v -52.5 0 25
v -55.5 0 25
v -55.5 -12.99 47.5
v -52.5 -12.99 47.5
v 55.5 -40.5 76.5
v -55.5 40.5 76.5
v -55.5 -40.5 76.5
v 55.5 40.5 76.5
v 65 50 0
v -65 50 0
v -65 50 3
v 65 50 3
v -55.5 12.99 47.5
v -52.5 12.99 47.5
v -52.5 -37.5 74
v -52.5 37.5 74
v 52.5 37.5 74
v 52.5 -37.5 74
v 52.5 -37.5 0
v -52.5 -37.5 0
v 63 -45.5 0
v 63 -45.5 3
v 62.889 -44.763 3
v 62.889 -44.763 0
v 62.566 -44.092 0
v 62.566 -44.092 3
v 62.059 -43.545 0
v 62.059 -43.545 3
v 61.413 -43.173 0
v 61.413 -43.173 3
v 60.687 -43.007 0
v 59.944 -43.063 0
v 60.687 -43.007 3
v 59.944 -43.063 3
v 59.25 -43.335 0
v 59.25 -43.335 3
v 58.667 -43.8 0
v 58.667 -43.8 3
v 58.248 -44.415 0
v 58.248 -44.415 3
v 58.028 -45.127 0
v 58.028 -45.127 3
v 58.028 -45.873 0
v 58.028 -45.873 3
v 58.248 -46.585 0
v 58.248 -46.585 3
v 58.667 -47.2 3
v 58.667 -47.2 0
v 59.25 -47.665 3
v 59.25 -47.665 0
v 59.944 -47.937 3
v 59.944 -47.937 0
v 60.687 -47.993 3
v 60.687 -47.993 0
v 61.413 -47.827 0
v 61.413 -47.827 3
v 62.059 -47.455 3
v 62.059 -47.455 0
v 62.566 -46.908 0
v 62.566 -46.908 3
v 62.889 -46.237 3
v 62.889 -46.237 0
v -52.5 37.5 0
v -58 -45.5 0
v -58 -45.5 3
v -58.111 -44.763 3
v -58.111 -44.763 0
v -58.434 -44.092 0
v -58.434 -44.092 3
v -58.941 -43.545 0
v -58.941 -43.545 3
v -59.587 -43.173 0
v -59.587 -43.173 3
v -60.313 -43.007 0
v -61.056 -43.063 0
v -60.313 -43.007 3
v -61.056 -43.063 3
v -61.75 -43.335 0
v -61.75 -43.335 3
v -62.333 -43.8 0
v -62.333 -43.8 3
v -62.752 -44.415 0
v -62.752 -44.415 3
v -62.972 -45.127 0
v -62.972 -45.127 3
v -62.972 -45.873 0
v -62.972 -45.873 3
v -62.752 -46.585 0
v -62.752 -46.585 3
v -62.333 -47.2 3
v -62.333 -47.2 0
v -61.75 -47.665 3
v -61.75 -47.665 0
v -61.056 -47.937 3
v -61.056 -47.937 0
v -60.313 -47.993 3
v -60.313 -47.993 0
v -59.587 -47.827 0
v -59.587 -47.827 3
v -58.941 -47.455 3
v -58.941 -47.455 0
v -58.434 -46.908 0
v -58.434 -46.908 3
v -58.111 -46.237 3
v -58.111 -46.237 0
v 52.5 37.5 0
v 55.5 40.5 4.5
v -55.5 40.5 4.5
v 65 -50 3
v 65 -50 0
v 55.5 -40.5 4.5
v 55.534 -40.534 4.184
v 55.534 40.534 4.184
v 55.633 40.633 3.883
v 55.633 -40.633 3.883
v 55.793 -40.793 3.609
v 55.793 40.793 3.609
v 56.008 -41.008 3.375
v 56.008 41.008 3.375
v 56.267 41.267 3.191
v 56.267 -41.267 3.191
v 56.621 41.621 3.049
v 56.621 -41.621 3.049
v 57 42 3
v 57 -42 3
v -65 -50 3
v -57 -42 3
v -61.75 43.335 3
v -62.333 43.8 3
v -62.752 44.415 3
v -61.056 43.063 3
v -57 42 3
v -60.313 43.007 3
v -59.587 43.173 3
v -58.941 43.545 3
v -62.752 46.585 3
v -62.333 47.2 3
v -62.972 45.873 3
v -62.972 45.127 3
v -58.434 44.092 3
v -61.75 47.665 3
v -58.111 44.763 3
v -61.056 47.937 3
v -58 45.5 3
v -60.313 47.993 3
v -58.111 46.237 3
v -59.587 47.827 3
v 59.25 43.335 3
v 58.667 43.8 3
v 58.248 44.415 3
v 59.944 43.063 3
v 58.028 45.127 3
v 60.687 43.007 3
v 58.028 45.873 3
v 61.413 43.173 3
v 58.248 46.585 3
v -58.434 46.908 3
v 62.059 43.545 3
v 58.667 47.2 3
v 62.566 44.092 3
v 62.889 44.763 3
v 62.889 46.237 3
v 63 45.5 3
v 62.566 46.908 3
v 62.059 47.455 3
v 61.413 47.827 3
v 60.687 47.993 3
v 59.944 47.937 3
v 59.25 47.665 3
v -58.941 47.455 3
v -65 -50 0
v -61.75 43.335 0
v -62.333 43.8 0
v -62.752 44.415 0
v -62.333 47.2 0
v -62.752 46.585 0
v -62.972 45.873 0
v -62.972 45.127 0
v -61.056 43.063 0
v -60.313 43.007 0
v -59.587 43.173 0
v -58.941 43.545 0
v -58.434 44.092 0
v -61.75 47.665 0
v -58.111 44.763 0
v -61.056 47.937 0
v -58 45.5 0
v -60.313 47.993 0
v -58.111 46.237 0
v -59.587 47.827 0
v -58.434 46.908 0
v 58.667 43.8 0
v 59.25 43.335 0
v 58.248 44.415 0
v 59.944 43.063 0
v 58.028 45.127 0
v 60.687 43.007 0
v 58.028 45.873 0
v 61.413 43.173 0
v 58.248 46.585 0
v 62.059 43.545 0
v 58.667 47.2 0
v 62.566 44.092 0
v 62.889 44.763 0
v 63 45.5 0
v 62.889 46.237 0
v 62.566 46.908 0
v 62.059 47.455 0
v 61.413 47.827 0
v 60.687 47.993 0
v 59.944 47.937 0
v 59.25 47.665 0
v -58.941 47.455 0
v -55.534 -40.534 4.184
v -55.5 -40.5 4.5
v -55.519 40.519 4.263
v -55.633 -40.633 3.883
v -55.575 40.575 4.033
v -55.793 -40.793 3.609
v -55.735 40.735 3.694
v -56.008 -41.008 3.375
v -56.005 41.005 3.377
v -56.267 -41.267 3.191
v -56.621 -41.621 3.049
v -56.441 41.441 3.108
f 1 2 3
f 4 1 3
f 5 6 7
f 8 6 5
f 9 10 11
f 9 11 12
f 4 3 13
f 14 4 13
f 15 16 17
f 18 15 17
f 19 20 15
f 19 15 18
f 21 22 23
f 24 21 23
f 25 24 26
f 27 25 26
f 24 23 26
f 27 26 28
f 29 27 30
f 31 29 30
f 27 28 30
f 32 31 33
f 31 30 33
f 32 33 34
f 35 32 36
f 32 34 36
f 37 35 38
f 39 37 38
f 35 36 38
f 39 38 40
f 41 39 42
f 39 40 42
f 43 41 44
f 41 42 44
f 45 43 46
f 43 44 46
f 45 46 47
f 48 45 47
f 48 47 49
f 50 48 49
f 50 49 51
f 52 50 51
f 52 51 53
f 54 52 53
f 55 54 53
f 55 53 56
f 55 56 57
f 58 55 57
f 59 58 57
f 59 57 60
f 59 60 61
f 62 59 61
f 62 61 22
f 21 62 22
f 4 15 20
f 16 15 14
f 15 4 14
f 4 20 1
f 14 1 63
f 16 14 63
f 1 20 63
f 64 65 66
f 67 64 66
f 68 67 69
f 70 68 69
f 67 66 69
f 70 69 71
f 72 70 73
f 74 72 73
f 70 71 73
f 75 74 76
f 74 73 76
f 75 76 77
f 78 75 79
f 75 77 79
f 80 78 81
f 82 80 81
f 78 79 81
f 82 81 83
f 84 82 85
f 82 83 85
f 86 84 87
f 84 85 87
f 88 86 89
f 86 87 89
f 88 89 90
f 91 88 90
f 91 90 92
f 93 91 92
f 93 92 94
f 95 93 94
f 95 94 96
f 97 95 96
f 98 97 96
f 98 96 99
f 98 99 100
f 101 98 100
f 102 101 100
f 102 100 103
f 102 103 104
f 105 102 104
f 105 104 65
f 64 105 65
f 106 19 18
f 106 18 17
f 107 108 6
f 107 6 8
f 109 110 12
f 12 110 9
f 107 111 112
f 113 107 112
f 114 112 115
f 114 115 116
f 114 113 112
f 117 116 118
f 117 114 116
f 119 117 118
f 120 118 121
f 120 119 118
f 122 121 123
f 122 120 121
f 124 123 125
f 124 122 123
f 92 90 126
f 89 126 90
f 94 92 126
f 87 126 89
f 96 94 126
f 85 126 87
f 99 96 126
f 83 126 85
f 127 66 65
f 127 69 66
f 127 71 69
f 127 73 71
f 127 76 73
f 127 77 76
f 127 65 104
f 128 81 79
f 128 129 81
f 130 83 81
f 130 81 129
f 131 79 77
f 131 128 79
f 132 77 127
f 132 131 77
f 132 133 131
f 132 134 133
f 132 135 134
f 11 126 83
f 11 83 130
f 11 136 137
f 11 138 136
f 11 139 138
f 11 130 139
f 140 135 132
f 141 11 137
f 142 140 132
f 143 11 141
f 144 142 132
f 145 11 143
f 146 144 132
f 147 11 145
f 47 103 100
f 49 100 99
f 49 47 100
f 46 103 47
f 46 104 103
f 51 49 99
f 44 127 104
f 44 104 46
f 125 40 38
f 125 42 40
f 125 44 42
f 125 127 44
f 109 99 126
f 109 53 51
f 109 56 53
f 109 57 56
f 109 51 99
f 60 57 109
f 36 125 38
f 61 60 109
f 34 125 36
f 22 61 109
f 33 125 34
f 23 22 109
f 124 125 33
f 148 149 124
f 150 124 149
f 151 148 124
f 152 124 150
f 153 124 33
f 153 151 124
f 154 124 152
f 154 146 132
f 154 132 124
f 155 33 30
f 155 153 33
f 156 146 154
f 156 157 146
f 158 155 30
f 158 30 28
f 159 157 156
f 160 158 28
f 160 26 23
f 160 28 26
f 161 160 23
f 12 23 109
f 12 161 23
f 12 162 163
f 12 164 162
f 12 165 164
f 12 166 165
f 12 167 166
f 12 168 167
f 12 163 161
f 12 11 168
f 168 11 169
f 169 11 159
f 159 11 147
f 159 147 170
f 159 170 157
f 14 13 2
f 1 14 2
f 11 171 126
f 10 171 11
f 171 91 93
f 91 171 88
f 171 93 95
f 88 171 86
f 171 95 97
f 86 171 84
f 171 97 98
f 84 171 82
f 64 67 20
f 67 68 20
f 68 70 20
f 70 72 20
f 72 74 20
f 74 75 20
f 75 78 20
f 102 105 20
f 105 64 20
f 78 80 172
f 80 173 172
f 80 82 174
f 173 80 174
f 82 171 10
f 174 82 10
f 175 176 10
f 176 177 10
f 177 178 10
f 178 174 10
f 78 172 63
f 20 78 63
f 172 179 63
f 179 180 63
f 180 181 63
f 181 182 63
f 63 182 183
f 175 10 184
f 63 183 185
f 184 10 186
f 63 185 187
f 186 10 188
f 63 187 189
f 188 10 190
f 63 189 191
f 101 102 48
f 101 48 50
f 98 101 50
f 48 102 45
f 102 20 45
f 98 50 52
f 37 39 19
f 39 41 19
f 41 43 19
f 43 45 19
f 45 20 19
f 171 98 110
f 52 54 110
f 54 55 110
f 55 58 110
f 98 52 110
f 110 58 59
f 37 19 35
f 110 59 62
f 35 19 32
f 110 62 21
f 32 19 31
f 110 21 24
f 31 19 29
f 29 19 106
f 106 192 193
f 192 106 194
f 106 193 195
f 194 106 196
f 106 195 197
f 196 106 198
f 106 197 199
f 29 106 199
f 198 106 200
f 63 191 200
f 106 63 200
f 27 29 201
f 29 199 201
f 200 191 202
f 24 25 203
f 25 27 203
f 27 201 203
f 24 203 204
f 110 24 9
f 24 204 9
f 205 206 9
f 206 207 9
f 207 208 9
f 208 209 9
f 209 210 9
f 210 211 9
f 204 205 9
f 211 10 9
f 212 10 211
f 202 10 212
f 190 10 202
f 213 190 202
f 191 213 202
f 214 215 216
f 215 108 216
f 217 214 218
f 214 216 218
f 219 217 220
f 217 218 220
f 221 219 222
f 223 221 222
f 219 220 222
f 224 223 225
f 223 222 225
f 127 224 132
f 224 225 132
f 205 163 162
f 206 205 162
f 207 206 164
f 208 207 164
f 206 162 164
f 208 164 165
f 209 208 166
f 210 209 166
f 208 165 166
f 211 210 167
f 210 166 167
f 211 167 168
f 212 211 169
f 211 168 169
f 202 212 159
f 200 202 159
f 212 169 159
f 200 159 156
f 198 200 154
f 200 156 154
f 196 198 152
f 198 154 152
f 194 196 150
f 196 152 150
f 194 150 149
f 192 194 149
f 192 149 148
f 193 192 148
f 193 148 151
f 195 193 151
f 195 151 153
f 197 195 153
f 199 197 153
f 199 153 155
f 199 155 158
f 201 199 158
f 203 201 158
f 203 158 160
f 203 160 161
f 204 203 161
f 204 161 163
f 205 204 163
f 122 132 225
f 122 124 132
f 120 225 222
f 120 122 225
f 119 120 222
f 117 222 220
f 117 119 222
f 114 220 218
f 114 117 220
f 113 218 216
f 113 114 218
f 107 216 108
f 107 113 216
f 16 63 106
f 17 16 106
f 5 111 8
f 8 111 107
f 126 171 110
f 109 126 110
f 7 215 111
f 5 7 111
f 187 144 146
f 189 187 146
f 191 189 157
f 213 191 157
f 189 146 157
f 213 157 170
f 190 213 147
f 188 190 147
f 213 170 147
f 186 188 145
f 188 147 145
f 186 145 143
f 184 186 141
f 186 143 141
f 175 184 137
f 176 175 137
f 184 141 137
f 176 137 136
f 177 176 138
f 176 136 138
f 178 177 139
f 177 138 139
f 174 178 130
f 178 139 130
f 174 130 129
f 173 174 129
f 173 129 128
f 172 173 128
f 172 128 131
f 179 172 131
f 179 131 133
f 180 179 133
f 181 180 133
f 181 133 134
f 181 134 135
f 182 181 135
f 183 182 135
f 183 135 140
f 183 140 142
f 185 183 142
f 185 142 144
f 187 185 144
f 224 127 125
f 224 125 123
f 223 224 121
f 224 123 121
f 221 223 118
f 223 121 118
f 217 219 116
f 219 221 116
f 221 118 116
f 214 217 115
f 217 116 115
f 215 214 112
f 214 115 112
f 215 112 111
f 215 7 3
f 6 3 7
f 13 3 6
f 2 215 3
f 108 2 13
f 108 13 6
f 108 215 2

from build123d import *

# Parameters (mm, degrees)
SKETCH_1_W          = 130
SKETCH_1_H          = 100
SKETCH_1_W_2        = 105
SKETCH_1_H_2        = 75
EXTRUDE_1_DEPTH     = 3
SKETCH_2_W          = 111
SKETCH_2_H          = 81
SKETCH_2_W_2        = 105
SKETCH_2_H_2        = 75
EXTRUDE_2_DEPTH     = 73.5
FILLET_1_R          = 1.5
SKETCH_4_R          = 2.5
CUT_EXTRUDE_2_DEPTH = 113.5
CUT_EXTRUDE_4_DEPTH = 73.5
SKETCH_7_W          = 105
SKETCH_7_H          = 75
EXTRUDE_3_DEPTH     = 2.5


with BuildPart() as part:
    # 草图1 → 凸台-拉伸1 (new body)
    with BuildSketch(Plane.XY):
        Rectangle(SKETCH_1_W, SKETCH_1_H)
        Rectangle(SKETCH_1_W_2, SKETCH_1_H_2, mode=Mode.SUBTRACT)
    extrude(amount=EXTRUDE_1_DEPTH)

    # 草图2 → 凸台-拉伸2 (add)
    with BuildSketch(Plane.XY.offset(3)):
        Rectangle(SKETCH_2_W, SKETCH_2_H)
        Rectangle(SKETCH_2_W_2, SKETCH_2_H_2, mode=Mode.SUBTRACT)
    extrude(amount=EXTRUDE_2_DEPTH)

    # 圆角1
    fillet_1_edges = [part.edges().sort_by_distance(p)[0] for p in [
        (55.5, 0, 3),
        (0, 40.5, 3),
        (-55.5, 0, 3),
        (0, -40.5, 3),
    ]]
    fillet(fillet_1_edges, radius=FILLET_1_R)

    # 草图4 → 切除-拉伸2 (cut)
    with BuildSketch(Plane.XY.offset(3)):
        with Locations((-60.5, 45.5)):
            Circle(SKETCH_4_R)
        with Locations((60.5, 45.5)):
            Circle(SKETCH_4_R)
        with Locations((60.5, -45.5)):
            Circle(SKETCH_4_R)
        with Locations((-60.5, -45.5)):
            Circle(SKETCH_4_R)
    extrude(amount=-CUT_EXTRUDE_2_DEPTH, mode=Mode.SUBTRACT)

    # 草图6 → 切除-拉伸4 (cut)
    with BuildSketch(Plane.ZY.offset(55.5)):
        Polygon((25, 0), (47.5, -12.990381057), (47.5, 12.990381057), align=None)
    extrude(amount=-CUT_EXTRUDE_4_DEPTH, mode=Mode.SUBTRACT)

    # 草图7 → 凸台-拉伸3 (add)
    with BuildSketch(Plane.XY.offset(76.5)):
        Rectangle(SKETCH_7_W, SKETCH_7_H)
    extrude(amount=-EXTRUDE_3_DEPTH)


solid = part.part
